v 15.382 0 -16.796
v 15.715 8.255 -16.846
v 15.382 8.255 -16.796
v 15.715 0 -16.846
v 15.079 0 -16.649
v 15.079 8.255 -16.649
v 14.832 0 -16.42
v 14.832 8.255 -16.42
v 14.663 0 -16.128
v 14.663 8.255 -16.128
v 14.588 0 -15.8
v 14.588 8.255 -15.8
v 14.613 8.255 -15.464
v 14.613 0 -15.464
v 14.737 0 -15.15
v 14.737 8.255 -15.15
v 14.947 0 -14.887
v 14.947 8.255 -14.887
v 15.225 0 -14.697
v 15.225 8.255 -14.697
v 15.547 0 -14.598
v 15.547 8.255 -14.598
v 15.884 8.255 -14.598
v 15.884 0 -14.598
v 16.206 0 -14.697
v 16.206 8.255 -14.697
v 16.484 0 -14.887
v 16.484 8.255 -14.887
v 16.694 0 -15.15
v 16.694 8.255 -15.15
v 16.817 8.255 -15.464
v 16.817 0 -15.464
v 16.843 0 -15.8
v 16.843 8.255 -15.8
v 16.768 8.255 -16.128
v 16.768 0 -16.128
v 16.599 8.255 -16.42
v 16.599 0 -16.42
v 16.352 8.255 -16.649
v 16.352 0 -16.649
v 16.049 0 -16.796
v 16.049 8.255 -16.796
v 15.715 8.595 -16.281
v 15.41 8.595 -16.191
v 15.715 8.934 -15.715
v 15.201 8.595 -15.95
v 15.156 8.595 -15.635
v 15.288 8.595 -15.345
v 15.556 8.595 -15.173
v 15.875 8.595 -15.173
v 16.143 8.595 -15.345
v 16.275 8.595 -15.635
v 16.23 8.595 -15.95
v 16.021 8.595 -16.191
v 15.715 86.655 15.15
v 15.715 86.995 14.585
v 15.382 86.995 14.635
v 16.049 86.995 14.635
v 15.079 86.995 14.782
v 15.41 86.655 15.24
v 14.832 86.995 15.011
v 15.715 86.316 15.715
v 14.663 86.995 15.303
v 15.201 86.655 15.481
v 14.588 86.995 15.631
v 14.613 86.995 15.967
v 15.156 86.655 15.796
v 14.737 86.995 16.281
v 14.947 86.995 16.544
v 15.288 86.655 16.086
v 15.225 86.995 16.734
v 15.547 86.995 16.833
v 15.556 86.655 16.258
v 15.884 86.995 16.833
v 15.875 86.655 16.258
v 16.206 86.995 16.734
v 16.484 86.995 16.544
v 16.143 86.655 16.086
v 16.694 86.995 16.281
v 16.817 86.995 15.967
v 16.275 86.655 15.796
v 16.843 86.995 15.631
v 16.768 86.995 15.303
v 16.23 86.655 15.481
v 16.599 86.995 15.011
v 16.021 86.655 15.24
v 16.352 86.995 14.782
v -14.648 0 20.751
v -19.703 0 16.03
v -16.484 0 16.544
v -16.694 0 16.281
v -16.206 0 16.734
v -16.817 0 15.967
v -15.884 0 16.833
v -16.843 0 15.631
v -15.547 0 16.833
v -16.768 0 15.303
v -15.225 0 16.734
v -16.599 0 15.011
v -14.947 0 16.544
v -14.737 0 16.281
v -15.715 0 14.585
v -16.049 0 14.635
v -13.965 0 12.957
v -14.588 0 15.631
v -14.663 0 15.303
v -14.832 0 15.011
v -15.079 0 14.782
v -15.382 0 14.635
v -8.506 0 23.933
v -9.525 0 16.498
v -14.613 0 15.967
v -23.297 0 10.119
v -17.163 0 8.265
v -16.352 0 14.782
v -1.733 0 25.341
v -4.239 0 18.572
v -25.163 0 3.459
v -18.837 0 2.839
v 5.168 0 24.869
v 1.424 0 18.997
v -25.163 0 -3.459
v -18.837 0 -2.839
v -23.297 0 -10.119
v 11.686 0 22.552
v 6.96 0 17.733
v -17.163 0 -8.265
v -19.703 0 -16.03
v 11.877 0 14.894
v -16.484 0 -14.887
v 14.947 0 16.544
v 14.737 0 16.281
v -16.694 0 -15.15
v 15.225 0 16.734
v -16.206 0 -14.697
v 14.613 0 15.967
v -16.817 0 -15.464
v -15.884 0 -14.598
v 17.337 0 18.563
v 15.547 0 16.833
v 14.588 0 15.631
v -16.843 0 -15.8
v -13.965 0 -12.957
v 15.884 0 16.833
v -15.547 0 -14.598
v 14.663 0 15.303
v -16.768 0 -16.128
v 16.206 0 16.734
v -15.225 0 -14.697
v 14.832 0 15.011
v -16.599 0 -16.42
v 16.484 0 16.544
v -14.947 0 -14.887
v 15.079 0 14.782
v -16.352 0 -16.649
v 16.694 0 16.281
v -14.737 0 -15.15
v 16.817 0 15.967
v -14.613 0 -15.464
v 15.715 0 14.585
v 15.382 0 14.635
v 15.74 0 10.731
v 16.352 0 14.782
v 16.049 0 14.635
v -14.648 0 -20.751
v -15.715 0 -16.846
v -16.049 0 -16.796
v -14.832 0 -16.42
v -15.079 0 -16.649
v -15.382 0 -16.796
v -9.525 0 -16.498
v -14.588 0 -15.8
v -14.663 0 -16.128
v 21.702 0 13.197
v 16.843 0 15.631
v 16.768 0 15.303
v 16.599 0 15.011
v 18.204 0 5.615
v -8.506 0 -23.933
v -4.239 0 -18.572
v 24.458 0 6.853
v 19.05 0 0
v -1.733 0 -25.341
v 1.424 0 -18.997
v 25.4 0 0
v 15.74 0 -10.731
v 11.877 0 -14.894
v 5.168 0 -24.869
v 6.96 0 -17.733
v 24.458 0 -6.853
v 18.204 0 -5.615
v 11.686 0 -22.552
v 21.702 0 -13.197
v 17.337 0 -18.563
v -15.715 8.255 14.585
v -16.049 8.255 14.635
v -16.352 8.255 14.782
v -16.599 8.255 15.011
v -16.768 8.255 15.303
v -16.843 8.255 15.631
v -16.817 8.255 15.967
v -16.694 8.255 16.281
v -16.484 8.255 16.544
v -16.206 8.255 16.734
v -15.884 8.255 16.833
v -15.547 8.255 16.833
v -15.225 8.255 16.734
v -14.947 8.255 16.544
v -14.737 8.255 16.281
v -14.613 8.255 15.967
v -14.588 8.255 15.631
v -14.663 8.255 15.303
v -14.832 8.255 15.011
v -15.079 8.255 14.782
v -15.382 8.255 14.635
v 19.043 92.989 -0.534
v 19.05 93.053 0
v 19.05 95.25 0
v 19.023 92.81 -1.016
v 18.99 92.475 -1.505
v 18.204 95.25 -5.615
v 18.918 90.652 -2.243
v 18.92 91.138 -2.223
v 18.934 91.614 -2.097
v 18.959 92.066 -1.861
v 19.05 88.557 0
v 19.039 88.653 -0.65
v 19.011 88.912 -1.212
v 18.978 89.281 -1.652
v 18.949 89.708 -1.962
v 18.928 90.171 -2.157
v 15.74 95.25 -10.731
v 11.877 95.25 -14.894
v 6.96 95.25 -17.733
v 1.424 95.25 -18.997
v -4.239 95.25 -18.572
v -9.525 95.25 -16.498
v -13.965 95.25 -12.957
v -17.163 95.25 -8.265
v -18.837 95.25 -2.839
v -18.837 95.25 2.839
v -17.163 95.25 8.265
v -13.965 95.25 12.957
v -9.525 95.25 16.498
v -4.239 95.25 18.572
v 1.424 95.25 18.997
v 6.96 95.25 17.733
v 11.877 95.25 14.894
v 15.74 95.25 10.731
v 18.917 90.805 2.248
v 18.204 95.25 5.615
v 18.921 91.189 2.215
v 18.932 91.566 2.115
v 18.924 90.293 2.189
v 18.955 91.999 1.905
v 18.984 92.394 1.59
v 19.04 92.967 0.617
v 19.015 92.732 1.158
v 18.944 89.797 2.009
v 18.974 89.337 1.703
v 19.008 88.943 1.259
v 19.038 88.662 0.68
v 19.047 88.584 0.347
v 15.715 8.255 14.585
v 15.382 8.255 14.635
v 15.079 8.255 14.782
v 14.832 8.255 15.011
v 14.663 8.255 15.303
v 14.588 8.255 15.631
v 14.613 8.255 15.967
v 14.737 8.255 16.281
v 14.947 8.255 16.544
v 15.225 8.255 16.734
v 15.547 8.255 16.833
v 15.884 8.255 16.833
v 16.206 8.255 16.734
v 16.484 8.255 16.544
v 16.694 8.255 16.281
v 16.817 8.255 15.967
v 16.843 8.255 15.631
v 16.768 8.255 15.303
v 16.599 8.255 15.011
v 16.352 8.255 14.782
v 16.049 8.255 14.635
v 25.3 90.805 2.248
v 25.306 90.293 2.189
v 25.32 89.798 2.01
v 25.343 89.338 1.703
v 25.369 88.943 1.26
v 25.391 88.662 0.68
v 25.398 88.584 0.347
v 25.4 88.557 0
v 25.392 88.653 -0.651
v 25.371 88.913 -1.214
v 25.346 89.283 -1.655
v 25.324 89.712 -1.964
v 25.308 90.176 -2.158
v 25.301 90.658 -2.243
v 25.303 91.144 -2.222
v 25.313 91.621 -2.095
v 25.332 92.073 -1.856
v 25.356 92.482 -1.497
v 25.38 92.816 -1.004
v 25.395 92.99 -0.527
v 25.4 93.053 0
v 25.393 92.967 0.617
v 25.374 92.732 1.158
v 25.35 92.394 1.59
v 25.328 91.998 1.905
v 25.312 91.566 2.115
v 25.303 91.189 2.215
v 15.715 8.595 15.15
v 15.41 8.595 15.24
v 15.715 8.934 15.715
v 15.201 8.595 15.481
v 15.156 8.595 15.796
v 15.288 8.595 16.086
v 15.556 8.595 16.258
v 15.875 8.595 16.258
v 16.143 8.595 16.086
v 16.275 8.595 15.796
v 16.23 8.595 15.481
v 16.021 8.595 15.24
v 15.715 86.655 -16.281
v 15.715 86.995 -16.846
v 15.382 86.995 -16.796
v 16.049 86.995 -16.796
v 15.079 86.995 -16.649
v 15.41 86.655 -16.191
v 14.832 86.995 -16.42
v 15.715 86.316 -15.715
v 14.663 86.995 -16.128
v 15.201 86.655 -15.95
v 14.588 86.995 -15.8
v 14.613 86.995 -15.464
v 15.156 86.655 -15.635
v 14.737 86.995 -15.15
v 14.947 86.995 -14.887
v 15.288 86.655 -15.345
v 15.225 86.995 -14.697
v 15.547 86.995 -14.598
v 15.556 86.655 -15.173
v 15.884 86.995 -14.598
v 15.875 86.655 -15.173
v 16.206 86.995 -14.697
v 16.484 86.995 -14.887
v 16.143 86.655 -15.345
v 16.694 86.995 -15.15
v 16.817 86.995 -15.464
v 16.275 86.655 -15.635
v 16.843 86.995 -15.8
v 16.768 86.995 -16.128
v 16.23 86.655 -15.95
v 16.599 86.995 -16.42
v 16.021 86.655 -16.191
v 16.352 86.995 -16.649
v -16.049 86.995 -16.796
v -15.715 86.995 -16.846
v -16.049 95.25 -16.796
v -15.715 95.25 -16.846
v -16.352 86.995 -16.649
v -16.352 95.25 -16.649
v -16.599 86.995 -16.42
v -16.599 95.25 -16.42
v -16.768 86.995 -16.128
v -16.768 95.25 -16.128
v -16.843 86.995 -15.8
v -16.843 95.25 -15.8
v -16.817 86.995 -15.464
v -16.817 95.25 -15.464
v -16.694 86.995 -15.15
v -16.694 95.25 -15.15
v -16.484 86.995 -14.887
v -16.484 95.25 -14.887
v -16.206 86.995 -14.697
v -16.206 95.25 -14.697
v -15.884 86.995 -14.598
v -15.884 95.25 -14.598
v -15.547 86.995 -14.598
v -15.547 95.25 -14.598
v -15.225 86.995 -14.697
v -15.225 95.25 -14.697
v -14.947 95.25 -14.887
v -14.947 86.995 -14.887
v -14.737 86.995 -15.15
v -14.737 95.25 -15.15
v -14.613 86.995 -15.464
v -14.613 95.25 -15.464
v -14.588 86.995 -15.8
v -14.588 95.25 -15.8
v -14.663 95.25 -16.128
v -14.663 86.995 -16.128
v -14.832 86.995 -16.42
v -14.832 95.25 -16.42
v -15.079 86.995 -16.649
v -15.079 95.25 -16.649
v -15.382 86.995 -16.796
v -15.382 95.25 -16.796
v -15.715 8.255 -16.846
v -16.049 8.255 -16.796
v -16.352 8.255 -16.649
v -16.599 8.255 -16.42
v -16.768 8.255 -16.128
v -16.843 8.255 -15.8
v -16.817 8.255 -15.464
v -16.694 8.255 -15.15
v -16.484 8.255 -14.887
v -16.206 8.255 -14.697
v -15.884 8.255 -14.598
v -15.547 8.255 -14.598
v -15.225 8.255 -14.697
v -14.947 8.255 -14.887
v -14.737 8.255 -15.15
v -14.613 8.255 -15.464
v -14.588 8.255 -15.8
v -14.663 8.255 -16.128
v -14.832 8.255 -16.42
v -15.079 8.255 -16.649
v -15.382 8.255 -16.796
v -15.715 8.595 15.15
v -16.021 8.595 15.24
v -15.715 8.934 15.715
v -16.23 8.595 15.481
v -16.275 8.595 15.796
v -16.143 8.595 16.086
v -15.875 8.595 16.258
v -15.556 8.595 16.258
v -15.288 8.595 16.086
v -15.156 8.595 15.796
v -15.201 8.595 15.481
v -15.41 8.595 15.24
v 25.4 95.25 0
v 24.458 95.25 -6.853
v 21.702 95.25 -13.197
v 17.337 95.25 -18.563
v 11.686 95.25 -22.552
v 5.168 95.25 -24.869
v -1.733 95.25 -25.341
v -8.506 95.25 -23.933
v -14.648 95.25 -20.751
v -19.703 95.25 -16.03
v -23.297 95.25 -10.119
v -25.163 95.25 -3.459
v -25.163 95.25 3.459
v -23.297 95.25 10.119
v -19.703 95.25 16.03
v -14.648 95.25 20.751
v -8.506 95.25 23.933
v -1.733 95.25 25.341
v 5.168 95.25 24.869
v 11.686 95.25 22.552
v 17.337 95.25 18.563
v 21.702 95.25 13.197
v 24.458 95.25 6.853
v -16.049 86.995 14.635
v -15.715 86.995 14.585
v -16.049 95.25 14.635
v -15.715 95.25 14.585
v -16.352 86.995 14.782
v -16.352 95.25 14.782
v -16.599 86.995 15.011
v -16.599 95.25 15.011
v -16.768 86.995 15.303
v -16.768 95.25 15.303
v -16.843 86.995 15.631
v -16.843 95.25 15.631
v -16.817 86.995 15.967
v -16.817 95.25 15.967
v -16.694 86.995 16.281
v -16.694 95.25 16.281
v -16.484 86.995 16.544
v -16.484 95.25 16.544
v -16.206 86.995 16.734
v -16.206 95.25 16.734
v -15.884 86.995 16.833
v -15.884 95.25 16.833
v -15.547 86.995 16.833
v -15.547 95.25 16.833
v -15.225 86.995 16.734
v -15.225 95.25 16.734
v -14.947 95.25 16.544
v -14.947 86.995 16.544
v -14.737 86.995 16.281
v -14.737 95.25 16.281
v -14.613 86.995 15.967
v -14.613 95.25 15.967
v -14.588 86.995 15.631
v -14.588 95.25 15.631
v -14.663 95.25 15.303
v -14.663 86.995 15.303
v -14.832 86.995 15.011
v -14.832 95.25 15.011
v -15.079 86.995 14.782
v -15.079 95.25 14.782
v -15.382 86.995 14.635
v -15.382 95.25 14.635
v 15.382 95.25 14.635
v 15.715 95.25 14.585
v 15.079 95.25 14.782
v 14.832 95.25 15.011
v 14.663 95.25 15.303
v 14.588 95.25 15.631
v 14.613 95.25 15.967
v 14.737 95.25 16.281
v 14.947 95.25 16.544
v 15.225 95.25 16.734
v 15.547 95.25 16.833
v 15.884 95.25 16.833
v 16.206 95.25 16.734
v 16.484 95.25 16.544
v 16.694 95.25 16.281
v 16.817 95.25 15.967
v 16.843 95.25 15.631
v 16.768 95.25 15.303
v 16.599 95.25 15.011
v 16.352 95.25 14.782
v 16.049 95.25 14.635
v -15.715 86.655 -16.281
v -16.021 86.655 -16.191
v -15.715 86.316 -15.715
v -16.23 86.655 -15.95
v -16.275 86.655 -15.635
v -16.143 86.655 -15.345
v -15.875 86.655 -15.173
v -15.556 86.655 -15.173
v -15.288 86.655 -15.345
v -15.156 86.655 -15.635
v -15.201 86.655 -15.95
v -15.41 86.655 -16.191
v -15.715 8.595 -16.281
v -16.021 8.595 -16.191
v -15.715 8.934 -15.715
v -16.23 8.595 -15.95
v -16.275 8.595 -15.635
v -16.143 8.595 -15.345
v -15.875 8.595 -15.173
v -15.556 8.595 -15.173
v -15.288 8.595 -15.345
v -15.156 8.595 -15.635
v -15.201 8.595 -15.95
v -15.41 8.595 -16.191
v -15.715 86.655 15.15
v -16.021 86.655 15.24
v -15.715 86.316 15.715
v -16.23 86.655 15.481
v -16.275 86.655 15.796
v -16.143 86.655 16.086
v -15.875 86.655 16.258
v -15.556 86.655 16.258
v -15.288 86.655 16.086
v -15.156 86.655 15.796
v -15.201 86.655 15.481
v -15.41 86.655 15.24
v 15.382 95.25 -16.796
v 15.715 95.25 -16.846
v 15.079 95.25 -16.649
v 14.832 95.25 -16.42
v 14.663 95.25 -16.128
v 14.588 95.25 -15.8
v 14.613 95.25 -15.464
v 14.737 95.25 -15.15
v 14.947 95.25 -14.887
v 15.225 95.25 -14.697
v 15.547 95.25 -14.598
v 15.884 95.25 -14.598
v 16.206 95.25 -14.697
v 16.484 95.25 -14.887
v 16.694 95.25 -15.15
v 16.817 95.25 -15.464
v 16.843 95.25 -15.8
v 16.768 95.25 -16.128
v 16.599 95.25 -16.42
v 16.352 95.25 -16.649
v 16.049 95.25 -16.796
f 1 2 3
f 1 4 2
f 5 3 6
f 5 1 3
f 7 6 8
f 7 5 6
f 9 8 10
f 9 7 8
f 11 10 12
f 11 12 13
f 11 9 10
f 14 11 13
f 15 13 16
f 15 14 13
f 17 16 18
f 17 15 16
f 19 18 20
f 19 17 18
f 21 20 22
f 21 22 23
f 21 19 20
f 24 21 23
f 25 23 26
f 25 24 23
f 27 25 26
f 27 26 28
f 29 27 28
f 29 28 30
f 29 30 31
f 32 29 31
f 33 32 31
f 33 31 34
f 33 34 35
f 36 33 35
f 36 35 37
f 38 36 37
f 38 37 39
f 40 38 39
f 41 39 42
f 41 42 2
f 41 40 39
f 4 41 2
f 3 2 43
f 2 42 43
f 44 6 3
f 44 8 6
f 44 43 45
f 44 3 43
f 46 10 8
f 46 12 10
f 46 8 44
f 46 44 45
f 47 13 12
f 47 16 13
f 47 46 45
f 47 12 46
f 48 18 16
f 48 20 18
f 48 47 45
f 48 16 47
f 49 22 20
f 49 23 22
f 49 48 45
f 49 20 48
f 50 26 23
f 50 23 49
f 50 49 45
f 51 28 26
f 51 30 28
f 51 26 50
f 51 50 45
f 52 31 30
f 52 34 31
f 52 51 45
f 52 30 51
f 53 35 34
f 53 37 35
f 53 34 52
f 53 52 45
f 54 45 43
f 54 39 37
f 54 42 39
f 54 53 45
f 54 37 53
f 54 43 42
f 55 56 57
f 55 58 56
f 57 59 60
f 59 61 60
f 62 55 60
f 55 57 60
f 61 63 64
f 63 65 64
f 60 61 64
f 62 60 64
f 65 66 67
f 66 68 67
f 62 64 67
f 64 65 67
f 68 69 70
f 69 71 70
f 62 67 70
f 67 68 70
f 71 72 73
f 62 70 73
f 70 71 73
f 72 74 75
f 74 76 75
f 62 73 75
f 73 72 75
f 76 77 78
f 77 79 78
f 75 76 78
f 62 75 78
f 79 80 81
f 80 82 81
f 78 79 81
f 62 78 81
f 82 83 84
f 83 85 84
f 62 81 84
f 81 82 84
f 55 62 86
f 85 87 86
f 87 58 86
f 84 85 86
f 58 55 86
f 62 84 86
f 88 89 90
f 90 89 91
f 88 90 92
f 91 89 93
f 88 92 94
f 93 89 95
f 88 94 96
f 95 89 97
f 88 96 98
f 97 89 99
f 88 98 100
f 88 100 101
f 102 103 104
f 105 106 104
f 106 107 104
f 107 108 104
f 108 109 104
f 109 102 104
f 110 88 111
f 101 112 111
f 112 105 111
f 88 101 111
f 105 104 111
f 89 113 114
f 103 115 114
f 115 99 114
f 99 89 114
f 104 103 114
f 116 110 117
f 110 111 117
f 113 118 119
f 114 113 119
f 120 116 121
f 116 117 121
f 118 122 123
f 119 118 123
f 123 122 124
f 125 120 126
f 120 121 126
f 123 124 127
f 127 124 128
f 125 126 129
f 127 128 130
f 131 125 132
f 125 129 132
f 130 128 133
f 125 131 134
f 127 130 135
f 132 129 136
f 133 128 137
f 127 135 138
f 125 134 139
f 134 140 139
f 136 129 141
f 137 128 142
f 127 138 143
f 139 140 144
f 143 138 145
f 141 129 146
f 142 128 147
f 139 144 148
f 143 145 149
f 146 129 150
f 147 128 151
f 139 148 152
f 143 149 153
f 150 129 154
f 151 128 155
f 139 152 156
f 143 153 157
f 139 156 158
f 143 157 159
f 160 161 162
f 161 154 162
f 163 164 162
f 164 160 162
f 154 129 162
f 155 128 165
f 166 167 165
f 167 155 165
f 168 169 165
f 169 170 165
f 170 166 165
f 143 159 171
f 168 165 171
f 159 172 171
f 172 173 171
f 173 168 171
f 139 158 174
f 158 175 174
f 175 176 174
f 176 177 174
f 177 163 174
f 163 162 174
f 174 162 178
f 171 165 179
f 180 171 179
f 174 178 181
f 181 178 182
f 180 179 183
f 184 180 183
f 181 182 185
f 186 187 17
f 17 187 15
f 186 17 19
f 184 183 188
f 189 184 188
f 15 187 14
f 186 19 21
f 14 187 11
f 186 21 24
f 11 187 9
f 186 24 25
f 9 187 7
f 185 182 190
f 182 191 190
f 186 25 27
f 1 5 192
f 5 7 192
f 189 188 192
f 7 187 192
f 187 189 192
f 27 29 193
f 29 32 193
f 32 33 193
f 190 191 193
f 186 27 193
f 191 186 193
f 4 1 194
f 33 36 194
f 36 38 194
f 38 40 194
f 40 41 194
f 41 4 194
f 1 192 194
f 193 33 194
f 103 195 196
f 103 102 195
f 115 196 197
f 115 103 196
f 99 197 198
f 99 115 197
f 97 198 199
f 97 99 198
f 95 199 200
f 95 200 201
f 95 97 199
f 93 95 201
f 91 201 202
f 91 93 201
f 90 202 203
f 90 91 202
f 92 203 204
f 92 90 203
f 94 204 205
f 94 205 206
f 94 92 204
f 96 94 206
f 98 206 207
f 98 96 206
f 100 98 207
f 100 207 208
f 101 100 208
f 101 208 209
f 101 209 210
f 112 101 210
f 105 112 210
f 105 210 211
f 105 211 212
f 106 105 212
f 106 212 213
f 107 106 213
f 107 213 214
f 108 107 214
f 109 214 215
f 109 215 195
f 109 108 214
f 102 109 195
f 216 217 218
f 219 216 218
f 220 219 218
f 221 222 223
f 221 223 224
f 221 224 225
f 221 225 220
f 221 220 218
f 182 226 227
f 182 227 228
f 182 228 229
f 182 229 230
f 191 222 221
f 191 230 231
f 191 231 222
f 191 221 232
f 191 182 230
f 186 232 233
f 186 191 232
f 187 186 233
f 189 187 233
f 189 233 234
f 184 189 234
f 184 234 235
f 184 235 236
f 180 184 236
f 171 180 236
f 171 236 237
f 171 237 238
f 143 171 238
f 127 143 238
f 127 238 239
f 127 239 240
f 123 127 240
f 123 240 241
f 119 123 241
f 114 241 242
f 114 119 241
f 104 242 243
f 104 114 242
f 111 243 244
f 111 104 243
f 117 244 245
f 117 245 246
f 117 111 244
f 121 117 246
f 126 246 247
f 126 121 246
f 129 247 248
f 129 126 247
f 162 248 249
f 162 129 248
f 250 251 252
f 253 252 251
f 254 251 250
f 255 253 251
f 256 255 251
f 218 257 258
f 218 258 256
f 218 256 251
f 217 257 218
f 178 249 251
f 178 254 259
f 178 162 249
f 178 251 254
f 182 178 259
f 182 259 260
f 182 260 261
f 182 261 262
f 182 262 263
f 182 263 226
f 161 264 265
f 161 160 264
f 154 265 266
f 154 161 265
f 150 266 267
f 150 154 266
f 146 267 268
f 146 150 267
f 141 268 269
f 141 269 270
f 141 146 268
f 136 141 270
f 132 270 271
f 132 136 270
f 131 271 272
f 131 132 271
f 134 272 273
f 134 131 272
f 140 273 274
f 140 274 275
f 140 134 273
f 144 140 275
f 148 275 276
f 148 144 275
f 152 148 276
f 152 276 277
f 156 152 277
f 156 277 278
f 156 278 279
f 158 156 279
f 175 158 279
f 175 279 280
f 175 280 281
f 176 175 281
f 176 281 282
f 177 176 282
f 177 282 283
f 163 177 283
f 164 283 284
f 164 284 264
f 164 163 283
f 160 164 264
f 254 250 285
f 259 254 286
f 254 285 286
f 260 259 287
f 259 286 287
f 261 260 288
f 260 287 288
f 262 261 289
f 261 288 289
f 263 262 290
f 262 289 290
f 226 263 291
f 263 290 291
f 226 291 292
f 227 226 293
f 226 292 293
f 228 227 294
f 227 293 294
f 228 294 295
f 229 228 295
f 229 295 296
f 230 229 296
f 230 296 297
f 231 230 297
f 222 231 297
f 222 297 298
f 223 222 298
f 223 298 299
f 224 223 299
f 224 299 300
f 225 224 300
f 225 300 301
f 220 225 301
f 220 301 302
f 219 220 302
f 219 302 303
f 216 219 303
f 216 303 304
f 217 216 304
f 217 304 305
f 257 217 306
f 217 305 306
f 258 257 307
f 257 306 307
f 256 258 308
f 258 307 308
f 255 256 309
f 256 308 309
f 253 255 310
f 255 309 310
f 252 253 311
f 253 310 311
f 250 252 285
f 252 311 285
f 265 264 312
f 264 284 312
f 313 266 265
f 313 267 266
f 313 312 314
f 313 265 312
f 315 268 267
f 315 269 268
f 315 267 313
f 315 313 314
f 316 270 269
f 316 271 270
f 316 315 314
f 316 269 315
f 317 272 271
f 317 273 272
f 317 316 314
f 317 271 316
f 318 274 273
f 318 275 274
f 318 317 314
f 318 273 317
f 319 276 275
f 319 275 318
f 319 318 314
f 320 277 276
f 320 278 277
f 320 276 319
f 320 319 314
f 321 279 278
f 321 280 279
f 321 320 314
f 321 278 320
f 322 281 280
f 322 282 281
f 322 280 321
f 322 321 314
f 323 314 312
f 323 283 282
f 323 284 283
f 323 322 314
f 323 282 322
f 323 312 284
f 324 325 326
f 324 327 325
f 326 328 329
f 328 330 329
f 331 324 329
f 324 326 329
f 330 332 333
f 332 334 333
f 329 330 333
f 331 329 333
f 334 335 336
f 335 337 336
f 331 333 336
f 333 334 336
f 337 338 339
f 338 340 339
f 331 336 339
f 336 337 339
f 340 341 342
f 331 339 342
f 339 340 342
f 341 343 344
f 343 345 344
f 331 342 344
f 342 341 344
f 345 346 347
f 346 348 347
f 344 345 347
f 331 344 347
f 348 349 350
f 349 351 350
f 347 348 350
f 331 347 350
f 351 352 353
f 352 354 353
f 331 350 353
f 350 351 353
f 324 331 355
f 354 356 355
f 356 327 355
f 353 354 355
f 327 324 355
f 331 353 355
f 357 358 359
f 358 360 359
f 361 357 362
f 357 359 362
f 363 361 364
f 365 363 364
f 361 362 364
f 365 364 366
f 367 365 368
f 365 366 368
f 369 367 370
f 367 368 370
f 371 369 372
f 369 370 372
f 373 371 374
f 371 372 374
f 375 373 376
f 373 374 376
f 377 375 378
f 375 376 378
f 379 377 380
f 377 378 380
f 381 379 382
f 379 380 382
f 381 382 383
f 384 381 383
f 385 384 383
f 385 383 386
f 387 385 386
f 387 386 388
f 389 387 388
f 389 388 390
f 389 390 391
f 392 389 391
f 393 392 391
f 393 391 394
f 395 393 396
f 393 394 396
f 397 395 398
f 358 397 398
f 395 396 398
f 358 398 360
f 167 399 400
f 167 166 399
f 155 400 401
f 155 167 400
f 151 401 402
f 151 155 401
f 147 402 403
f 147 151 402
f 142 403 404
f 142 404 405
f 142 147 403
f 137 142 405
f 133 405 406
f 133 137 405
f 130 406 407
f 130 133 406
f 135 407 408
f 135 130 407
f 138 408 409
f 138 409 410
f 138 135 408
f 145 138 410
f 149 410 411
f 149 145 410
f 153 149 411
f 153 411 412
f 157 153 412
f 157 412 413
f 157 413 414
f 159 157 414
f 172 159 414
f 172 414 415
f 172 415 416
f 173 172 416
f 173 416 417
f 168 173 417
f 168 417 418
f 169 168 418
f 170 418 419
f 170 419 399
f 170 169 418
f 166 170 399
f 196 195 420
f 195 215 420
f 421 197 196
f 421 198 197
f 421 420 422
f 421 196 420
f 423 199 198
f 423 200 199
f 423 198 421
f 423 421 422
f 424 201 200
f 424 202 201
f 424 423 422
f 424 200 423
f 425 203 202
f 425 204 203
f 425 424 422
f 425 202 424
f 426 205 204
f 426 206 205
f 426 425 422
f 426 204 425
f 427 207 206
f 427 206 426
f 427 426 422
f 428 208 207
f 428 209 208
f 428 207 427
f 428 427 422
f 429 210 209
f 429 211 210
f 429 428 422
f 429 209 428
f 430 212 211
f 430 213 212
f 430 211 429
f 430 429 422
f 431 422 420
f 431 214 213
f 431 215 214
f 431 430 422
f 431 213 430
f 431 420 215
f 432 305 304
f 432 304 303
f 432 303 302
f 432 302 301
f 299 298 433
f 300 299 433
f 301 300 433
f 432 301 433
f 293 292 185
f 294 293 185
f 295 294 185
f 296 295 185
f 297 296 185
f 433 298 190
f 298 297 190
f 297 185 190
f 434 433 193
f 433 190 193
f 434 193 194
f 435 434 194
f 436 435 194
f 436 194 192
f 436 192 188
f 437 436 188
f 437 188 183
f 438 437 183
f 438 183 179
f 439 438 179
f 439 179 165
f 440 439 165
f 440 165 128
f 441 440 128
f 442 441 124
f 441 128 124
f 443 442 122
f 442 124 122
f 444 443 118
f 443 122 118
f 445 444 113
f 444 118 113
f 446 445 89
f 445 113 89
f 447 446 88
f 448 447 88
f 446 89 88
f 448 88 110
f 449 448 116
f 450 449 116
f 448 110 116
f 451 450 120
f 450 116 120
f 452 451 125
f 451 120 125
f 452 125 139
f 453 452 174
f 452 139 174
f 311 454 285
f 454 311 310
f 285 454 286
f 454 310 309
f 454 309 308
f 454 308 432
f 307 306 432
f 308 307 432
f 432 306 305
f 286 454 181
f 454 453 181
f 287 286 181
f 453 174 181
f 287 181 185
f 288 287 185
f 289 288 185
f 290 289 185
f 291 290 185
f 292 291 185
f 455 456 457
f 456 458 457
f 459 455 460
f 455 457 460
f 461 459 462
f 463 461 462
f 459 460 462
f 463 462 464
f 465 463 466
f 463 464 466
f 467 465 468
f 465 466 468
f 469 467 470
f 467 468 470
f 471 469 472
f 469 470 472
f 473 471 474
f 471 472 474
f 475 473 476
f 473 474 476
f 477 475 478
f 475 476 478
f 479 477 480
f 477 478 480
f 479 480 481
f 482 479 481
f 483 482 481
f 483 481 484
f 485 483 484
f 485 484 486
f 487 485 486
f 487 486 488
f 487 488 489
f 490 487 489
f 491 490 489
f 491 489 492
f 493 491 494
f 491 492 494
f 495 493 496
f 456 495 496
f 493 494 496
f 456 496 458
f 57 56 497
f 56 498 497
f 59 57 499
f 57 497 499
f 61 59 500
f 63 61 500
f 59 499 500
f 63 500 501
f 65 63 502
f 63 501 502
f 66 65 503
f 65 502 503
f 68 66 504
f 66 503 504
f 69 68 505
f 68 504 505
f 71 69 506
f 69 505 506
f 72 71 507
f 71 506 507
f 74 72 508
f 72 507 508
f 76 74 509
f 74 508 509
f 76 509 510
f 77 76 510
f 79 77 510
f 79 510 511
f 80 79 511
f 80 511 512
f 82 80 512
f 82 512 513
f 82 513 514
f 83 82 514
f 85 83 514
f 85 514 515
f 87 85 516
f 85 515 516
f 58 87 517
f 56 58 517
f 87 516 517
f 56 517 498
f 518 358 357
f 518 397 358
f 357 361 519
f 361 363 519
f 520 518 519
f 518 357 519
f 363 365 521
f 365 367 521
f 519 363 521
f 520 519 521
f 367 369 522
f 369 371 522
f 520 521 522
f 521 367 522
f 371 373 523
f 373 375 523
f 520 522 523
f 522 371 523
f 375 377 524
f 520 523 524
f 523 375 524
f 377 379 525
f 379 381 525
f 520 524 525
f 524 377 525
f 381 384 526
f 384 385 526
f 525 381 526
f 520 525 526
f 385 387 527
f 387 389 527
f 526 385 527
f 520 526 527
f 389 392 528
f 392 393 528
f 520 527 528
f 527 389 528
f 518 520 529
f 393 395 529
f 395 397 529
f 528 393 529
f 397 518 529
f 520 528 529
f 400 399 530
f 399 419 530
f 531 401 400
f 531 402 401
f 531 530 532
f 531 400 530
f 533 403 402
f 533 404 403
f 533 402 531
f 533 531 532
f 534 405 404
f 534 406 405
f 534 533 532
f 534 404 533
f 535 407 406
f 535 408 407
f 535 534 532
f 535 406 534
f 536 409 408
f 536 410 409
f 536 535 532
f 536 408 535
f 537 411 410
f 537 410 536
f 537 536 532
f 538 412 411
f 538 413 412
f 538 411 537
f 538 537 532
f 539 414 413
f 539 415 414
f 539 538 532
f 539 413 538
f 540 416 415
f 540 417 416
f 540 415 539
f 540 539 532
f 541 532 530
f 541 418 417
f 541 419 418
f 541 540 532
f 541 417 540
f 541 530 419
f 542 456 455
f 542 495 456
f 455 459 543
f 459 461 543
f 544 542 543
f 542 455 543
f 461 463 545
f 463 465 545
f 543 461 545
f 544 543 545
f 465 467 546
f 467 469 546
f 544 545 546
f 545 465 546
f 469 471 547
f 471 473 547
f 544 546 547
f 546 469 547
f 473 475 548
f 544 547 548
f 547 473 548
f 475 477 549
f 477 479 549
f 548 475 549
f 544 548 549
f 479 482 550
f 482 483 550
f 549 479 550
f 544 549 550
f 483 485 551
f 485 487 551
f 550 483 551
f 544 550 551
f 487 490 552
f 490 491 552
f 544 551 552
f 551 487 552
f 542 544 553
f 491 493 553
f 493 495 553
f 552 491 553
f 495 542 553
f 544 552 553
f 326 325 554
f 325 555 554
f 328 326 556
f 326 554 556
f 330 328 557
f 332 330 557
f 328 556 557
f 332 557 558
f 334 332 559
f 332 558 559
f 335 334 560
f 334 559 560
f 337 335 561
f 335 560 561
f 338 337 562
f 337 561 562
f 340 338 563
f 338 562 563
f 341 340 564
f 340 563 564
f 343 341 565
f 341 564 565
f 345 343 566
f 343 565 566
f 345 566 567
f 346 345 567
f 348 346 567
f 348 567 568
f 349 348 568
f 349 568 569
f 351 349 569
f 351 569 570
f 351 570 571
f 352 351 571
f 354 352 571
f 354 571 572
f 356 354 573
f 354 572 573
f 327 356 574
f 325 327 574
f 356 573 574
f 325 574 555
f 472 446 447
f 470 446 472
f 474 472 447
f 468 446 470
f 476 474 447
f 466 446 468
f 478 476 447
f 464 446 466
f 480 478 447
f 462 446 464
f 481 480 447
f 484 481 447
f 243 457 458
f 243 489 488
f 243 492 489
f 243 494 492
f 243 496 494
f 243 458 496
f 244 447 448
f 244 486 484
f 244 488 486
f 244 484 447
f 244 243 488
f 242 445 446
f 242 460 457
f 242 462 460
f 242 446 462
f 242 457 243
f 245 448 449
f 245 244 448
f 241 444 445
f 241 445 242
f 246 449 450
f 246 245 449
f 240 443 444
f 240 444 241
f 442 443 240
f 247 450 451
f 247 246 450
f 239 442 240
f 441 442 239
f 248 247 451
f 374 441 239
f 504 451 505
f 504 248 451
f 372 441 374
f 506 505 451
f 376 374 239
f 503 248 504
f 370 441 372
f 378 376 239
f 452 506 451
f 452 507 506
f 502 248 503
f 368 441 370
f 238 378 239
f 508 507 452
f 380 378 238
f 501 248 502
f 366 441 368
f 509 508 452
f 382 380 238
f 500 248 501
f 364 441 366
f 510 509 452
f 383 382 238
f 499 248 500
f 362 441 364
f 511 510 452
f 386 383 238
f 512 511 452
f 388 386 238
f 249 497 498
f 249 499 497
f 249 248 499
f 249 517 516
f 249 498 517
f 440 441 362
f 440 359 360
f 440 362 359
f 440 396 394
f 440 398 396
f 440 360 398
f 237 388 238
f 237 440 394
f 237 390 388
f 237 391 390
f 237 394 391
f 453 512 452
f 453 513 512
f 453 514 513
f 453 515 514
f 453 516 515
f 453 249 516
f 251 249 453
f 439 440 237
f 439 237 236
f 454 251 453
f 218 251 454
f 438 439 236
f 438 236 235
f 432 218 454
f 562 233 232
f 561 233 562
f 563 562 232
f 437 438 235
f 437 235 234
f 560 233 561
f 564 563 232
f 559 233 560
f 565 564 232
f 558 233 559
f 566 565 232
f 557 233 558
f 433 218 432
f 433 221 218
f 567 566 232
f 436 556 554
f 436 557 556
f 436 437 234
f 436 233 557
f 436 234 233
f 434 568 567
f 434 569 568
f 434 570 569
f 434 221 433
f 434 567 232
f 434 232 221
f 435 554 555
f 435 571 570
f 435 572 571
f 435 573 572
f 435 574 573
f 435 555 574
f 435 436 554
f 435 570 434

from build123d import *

# Parameters (mm, degrees)
SKETCH1_R                      = 25.4
SKETCH1_R_2                    = 19.05
BOSS_EXTRUDE1_DEPTH            = 95.25
F_4_40_TAPPED_HOLE1_AT_2_COUNT = 2
F_4_40_TAPPED_HOLE1_AT_2_PITCH = 31.430896424
F_4_40_TAPPED_HOLE1_AT_3_COUNT = 2
F_4_40_TAPPED_HOLE1_AT_3_PITCH = 44.45
F_4_40_TAPPED_HOLE1_AT_4_COUNT = 2
F_4_40_TAPPED_HOLE1_AT_4_PITCH = 31.430896424
F_4_40_TAPPED_HOLE1_AT_5_COUNT = 2
F_4_40_TAPPED_HOLE1_AT_5_PITCH = 22.225
SKETCH7_W                      = 2.2479
SKETCH7_H                      = 25.4


with BuildPart() as part:
    # Sketch1 → Boss-Extrude1 (new body)
    with BuildSketch(Plane(origin=(0, 0, 0), x_dir=(1, 0, 0), z_dir=(0, 1, 0))):
        Circle(SKETCH1_R)
        Circle(SKETCH1_R_2, mode=Mode.SUBTRACT)
    extrude(amount=BOSS_EXTRUDE1_DEPTH)

    # Sketch2 → #4-40 Tapped Hole1 (revolve, cut)
    with BuildSketch(Plane(origin=(-15.715448212, 0, -15.715448212), x_dir=(0, 0, -1), z_dir=(1, 0, 0))):
        Polygon((0, 0), (0, 8.934152758), (1.1303, 8.255), (1.1303, 0), align=None)
    f_4_40_tapped_hole1 = revolve(axis=Axis((-15.715448212, -6.35, -15.715448212), (0, 1, 0)), mode=Mode.SUBTRACT)

    # #4-40 Tapped Hole1 at 2: #4-40 Tapped Hole1 ×2
    with Locations(*[(0, 0, i * F_4_40_TAPPED_HOLE1_AT_2_PITCH) for i in range(1, F_4_40_TAPPED_HOLE1_AT_2_COUNT)]):
        add(f_4_40_tapped_hole1, mode=Mode.SUBTRACT)

    # #4-40 Tapped Hole1 at 3: #4-40 Tapped Hole1 ×2
    with Locations(*[Vector(0.707106781, 0, 0.707106781) * (i * F_4_40_TAPPED_HOLE1_AT_3_PITCH) for i in range(1, F_4_40_TAPPED_HOLE1_AT_3_COUNT)]):
        add(f_4_40_tapped_hole1, mode=Mode.SUBTRACT)

    # #4-40 Tapped Hole1 at 4: #4-40 Tapped Hole1 ×2
    with Locations(*[(i * F_4_40_TAPPED_HOLE1_AT_4_PITCH, 0, 0) for i in range(1, F_4_40_TAPPED_HOLE1_AT_4_COUNT)]):
        add(f_4_40_tapped_hole1, mode=Mode.SUBTRACT)

    # #4-40 Tapped Hole1 at 5: #4-40 Tapped Hole1 ×2
    with Locations(*[Vector(0.707106781, 0, 0.707106781) * (i * F_4_40_TAPPED_HOLE1_AT_5_PITCH) for i in range(1, F_4_40_TAPPED_HOLE1_AT_5_COUNT)]):
        add(f_4_40_tapped_hole1, mode=Mode.SUBTRACT)

    # Mirror1: #4-40 Tapped Hole1 across plane
    add(f_4_40_tapped_hole1.mirror(Plane(origin=(0, 47.625, 0), x_dir=(0, 0, 1), z_dir=(0, -1, 0))), mode=Mode.SUBTRACT)

    # Mirror1 copy 1 sketch → Mirror1 copy 1 (revolve, cut)
    with BuildSketch(Plane(origin=(-15.715448212, 95.25, 15.715448212), x_dir=(0, 0, -1), z_dir=(1, 0, 0))):
        Polygon((0, 0), (0, -8.934152758), (1.1303, -8.255), (1.1303, 0), align=None)
    revolve(axis=Axis((-15.715448212, 101.6, 15.715448212), (0, 1, 0)), mode=Mode.SUBTRACT)

    # Mirror1 copy 2 sketch → Mirror1 copy 2 (revolve, cut)
    with BuildSketch(Plane(origin=(15.715448212, 95.25, 15.715448212), x_dir=(0, 0, -1), z_dir=(1, 0, 0))):
        Polygon((0, 0), (0, -8.934152758), (1.1303, -8.255), (1.1303, 0), align=None)
    revolve(axis=Axis((15.715448212, 101.6, 15.715448212), (0, 1, 0)), mode=Mode.SUBTRACT)

    # Mirror1 copy 3 sketch → Mirror1 copy 3 (revolve, cut)
    with BuildSketch(Plane(origin=(15.715448212, 95.25, -15.715448212), x_dir=(0, 0, -1), z_dir=(1, 0, 0))):
        Polygon((0, 0), (0, -8.934152758), (1.1303, -8.255), (1.1303, 0), align=None)
    revolve(axis=Axis((15.715448212, 101.6, -15.715448212), (0, 1, 0)), mode=Mode.SUBTRACT)

    # Mirror1 copy 4 sketch → Mirror1 copy 4 (revolve, cut)
    with BuildSketch(Plane(origin=(0, 95.25, 0), x_dir=(0, 0, -1), z_dir=(1, 0, 0))):
        Polygon((0, 0), (0, -8.934152758), (1.1303, -8.255), (1.1303, 0), align=None)
    revolve(axis=Axis((0, 101.6, 0), (0, 1, 0)), mode=Mode.SUBTRACT)

    # Sketch7 → #8 Clearance Hole1 (revolve, cut)
    with BuildSketch(Plane.ZX.offset(90.805)):
        with Locations((1.12395, 12.7)):
            Rectangle(SKETCH7_W, SKETCH7_H)
    revolve(axis=Axis((-6.35, 90.805, 0), (1, 0, 0)), mode=Mode.SUBTRACT)


solid = part.part
